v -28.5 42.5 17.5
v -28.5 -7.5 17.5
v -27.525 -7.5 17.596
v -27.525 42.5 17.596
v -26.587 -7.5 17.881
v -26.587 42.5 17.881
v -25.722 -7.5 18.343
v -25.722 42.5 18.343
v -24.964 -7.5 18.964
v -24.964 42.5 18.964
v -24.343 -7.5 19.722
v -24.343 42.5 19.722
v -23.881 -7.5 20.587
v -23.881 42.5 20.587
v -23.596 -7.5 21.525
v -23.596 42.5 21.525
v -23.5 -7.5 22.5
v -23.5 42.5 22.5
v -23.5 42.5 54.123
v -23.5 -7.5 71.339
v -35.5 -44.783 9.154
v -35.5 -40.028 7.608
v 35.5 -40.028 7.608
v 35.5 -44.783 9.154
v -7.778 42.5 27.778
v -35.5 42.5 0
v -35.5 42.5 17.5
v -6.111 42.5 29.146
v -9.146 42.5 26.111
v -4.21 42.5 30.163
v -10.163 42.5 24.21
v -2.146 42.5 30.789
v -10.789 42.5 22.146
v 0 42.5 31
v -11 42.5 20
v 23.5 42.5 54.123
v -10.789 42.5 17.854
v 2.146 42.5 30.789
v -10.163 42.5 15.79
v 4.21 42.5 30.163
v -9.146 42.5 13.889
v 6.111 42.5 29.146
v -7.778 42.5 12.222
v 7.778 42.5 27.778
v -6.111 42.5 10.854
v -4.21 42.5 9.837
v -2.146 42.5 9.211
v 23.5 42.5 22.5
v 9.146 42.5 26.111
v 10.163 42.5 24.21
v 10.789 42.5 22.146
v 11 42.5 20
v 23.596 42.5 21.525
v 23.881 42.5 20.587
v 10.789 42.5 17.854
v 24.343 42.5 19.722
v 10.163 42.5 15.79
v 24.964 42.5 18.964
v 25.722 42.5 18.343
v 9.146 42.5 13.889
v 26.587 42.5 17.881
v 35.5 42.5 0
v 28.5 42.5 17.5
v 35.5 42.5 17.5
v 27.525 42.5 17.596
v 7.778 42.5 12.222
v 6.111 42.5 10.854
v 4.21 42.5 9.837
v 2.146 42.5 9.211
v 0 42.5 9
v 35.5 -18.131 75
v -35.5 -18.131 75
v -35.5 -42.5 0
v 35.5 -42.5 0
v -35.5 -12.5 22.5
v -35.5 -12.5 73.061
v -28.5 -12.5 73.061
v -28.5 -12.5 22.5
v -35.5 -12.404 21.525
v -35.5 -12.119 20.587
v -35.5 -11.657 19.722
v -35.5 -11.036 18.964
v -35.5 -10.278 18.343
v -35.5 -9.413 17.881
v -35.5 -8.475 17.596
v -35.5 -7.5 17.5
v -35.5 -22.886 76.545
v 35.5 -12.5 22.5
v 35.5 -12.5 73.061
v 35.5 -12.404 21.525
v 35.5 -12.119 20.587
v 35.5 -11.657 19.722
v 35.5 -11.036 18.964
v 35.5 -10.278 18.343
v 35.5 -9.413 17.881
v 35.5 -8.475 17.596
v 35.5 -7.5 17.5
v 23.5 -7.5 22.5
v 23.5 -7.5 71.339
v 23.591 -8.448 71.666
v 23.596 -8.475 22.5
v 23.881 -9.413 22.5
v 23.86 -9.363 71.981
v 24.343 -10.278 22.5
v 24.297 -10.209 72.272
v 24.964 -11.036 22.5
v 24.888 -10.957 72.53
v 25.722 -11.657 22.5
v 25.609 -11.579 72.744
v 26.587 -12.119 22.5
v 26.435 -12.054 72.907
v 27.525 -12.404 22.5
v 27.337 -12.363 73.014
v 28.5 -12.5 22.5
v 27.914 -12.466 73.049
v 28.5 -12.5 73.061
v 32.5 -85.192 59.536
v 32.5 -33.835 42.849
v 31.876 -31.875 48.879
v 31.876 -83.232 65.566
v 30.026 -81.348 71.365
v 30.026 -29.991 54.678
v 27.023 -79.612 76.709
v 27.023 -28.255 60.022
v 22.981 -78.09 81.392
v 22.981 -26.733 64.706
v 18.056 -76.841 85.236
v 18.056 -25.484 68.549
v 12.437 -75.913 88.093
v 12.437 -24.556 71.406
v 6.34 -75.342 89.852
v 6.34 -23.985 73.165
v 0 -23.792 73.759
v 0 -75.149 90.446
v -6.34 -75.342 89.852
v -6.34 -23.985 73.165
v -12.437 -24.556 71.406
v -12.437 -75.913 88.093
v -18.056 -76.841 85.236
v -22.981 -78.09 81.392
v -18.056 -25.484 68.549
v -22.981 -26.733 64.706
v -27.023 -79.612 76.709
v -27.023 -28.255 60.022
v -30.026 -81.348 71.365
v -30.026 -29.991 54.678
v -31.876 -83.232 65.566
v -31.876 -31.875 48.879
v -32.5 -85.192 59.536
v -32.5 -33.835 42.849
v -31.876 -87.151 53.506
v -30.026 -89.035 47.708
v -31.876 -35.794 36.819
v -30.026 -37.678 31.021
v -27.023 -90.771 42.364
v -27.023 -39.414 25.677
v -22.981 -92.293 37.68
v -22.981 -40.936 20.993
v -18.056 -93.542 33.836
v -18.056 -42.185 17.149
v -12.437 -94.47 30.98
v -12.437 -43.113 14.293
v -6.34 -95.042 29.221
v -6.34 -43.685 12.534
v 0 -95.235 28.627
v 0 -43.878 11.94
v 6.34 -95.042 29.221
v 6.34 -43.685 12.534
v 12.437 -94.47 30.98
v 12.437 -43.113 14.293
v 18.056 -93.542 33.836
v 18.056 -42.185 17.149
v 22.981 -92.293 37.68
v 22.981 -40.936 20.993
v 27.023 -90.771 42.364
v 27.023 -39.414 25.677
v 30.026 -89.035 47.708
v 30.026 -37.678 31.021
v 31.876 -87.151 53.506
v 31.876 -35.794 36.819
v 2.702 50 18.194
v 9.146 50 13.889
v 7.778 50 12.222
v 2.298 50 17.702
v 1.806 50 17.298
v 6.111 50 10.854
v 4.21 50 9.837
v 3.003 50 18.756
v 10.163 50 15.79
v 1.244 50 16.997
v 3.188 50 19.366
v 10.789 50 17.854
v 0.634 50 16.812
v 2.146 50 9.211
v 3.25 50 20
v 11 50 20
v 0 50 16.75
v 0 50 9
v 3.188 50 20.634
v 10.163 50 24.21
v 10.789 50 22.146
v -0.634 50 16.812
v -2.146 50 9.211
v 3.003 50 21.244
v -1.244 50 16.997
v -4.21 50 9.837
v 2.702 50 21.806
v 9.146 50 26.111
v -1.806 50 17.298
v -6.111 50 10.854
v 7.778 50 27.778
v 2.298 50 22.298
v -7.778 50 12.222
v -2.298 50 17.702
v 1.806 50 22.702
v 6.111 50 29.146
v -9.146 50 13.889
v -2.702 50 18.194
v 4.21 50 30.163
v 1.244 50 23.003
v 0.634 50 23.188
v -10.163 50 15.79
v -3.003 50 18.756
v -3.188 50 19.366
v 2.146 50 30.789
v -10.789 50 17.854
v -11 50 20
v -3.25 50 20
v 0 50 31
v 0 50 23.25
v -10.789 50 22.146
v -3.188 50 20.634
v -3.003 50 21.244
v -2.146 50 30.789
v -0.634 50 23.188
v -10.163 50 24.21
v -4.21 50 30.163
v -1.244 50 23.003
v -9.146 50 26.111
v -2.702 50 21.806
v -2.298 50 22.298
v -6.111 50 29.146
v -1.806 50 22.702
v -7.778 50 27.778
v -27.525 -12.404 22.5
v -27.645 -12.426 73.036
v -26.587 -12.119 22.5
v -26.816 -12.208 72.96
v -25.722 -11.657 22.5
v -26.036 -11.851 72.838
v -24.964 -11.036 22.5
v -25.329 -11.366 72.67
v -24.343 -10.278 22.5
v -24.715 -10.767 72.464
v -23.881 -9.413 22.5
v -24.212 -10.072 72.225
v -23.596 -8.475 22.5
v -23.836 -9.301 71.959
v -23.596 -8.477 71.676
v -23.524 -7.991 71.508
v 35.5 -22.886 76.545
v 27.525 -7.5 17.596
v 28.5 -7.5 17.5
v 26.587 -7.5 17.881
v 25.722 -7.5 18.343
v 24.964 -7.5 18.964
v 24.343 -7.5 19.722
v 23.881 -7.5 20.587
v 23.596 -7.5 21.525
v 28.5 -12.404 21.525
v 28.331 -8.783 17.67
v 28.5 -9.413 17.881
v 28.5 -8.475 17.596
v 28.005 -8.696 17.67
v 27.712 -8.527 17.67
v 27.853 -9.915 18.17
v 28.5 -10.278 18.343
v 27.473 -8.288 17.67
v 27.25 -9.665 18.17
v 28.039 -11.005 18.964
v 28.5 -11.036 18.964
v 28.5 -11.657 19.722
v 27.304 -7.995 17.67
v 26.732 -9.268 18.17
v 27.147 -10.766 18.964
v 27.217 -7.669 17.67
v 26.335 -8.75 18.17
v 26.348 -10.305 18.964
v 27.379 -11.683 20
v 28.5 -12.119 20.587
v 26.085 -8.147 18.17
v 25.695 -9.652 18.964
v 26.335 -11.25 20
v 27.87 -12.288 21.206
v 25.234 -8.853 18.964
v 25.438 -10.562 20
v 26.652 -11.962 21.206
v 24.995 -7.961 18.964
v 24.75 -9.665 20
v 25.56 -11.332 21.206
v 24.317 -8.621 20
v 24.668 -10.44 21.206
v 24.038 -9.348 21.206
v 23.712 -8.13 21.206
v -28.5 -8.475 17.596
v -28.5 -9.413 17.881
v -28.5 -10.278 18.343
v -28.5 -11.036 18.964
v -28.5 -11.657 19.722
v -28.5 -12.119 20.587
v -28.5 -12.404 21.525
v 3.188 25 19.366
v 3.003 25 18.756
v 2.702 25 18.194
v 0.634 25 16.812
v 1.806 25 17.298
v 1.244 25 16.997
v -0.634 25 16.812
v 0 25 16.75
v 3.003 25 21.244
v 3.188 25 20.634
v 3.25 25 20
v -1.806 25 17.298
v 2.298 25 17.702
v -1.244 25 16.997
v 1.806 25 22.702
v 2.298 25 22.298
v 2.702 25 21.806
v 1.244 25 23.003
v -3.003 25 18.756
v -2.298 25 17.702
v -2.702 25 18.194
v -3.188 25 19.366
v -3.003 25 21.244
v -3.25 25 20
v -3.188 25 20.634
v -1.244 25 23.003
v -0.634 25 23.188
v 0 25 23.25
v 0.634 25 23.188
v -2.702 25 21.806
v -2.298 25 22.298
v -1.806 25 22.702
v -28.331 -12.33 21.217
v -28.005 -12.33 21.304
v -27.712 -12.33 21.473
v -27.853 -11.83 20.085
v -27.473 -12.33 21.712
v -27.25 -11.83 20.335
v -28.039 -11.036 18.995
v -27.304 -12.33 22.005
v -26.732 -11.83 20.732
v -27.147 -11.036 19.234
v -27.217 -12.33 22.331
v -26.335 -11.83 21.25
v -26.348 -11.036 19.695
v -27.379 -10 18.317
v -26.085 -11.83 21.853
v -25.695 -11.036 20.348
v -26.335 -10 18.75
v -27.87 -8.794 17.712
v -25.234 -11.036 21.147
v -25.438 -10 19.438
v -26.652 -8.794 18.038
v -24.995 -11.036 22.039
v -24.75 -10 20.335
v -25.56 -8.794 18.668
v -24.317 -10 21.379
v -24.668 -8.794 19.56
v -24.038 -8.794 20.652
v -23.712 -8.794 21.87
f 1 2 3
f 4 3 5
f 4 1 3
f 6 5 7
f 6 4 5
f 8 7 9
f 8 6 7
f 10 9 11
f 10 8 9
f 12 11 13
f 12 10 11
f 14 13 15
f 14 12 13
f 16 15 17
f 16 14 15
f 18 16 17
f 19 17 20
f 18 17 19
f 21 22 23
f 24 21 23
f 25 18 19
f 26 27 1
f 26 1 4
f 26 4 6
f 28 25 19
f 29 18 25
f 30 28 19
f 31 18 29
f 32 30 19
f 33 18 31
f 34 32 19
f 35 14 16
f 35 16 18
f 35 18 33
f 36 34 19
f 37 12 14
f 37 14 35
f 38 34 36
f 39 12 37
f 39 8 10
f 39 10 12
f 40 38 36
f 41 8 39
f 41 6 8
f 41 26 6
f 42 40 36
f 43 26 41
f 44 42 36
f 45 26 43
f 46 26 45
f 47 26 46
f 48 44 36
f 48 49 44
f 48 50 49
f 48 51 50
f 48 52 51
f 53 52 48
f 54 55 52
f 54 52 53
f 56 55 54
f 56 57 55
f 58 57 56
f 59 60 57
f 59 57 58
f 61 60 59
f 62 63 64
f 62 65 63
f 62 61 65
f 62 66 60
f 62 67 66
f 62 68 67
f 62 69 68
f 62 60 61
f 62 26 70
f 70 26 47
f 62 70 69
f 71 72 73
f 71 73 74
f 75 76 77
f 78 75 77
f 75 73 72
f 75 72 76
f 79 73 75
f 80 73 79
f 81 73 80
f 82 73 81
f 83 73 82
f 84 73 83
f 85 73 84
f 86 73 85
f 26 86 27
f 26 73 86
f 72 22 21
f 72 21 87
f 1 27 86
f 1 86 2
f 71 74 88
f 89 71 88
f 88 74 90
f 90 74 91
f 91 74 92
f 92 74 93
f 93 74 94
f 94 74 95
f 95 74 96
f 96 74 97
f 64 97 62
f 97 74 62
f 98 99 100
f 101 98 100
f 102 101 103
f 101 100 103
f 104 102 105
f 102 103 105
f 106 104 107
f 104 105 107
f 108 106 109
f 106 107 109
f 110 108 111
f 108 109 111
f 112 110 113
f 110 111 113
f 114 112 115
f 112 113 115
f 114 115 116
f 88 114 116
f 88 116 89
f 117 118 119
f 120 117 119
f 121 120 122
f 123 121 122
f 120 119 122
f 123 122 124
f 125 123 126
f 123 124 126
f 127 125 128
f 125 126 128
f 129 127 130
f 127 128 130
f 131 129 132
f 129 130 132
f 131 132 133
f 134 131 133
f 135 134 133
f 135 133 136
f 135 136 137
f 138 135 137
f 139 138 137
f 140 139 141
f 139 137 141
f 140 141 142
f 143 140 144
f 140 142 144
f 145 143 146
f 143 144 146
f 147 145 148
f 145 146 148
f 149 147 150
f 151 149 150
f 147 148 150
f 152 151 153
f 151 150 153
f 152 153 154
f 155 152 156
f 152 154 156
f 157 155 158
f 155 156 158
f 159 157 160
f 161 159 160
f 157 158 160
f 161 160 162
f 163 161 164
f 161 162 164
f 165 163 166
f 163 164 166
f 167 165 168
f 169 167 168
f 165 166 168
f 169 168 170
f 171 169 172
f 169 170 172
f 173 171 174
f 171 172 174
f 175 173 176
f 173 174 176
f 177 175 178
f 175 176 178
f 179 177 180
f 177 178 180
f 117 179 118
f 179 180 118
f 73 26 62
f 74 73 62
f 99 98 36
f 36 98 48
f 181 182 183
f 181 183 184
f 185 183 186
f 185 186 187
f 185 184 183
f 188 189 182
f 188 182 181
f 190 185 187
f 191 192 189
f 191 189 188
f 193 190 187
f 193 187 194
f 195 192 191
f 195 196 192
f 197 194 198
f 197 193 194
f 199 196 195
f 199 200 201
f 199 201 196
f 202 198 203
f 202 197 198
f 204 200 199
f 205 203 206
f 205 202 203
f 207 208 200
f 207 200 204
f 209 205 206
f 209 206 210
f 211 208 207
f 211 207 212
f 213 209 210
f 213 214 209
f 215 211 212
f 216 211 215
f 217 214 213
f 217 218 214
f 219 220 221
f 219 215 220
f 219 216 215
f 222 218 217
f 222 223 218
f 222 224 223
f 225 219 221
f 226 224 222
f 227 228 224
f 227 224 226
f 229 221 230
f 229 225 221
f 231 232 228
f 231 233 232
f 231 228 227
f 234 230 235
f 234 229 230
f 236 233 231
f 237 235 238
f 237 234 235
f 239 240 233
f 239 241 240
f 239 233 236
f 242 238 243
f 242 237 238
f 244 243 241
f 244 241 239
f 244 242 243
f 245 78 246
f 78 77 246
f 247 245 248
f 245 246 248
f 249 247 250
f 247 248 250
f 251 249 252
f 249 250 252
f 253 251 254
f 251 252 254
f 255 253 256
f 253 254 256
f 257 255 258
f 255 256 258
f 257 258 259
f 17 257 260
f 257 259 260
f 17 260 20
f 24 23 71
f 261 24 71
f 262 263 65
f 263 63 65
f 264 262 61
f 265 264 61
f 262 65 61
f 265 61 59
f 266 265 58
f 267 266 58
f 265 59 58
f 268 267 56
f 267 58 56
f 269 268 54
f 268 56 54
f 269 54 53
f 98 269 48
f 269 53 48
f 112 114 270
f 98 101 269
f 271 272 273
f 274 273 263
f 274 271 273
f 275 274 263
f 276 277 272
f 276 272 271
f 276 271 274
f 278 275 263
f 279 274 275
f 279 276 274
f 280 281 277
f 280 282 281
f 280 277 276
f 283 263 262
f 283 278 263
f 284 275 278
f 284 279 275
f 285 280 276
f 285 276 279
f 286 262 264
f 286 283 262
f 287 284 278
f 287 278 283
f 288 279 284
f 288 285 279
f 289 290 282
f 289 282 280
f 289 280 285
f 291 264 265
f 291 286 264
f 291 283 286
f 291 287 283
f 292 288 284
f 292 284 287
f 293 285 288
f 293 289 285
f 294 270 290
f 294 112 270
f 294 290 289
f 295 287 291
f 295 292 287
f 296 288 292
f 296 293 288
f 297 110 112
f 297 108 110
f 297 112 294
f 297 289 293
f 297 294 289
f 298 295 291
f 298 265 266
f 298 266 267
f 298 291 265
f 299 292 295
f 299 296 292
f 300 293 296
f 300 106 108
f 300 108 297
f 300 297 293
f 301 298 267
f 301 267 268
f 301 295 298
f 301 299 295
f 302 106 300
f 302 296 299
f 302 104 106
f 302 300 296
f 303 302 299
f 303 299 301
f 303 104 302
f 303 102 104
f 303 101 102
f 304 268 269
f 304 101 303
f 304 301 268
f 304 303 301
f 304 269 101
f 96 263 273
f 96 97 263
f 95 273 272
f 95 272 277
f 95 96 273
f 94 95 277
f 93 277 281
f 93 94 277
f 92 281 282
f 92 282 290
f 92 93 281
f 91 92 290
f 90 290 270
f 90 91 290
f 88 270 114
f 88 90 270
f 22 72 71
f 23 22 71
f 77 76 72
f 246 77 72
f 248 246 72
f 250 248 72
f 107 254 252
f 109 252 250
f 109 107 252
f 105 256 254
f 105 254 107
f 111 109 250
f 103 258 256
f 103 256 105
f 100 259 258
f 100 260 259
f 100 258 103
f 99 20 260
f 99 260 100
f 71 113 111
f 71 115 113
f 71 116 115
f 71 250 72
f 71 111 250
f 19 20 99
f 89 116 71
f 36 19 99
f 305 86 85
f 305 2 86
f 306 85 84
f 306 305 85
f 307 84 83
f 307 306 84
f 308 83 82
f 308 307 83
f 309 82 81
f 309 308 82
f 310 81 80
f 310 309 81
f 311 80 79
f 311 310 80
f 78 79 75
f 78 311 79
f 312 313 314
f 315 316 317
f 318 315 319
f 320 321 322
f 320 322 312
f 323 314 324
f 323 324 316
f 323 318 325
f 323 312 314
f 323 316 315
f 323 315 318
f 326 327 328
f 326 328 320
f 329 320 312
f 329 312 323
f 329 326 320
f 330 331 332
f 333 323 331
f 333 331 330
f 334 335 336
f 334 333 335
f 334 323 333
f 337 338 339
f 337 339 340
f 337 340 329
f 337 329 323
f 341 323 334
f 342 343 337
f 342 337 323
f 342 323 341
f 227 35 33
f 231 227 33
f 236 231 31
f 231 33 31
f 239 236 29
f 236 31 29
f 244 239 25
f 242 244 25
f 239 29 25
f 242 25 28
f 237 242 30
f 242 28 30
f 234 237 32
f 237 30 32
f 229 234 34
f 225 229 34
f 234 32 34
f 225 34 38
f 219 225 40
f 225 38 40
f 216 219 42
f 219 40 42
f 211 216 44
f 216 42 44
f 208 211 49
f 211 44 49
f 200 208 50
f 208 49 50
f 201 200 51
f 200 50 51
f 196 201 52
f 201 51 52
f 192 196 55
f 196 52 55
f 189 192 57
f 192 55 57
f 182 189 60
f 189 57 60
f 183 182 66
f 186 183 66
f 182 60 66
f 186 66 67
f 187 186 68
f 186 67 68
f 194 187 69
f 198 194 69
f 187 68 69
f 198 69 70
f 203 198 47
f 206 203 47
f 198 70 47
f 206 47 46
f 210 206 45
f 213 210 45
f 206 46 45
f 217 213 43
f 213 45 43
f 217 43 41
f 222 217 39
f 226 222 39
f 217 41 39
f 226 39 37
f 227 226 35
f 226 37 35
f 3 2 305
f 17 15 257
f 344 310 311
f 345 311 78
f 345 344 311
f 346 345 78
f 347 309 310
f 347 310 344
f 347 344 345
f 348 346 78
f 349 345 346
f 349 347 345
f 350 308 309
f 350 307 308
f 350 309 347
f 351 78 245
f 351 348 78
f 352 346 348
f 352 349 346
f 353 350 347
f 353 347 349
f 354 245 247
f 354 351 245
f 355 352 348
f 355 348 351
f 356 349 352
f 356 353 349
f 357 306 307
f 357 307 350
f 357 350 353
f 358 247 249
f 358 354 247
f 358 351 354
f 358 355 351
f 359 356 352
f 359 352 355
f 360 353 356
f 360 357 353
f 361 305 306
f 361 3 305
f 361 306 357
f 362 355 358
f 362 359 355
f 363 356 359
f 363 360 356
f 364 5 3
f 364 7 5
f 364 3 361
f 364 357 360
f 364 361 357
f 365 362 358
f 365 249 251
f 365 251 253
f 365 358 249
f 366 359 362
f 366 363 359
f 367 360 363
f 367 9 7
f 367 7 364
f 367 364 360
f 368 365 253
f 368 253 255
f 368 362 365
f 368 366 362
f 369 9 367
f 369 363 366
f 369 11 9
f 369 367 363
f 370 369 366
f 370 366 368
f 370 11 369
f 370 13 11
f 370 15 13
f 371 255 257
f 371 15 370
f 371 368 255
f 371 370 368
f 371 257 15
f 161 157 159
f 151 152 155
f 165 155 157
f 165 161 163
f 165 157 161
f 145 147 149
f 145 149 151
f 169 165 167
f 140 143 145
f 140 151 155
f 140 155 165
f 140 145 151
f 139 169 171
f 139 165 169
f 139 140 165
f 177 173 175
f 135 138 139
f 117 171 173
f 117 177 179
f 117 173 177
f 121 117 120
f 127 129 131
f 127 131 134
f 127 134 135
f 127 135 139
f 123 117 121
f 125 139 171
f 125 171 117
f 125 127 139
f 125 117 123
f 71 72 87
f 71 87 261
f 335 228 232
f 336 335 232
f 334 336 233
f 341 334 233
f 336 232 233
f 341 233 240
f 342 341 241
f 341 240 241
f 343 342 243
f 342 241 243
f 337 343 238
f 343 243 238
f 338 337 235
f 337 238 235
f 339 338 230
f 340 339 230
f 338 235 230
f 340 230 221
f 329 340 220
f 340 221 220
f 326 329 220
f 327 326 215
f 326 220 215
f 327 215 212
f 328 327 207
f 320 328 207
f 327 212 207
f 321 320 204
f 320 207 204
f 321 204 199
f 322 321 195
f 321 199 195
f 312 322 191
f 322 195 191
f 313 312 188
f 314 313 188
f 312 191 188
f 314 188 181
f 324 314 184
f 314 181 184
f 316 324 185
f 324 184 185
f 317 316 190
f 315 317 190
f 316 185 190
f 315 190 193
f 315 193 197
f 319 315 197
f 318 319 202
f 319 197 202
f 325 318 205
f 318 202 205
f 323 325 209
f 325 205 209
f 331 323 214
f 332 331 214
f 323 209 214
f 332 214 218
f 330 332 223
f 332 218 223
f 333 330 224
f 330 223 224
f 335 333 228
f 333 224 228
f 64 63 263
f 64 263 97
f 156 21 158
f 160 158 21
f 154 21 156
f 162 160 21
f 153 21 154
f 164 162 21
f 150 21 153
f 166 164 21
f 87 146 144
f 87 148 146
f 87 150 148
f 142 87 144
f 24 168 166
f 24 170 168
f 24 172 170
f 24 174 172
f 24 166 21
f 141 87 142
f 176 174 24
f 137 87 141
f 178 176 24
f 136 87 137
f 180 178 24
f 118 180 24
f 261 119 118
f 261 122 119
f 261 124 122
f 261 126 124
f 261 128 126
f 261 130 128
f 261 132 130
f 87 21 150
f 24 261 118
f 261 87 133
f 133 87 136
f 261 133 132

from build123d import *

# Parameters (mm, degrees)
F0_W      = 71
F0_H      = 85
F1_DEPTH  = 75
F3_W      = 71
F3_H      = 103.9073709636
F4_DEPTH  = 23.1772745781
F6_W      = 71
F6_H      = 81.7453698828
F7_DEPTH  = 19.7405301902
F9_W      = 12
F9_H      = 55
F10_DEPTH = 57.501
F11_R     = 5
F12_R     = 11
F13_DEPTH = 7.5
F14_R     = 3.25
F15_DEPTH = 25
F16_W     = 71
F16_H     = 70.8596668179
F17_DEPTH = 5
F18_R     = 32.5
F19_DEPTH = 54


with BuildPart() as f1:
    # F0 (on Top) → F1 (new body)
    with BuildSketch(Plane.XY):
        Rectangle(F0_W, F0_H)
    extrude(amount=F1_DEPTH)

    # F3 (on face) → F4 (cut, through all)
    with BuildSketch(Plane(origin=(0, -38.4416111305, 12.4904366112), x_dir=(1, 0, 0), z_dir=(0, -0.9510565163, 0.3090169944))):
        with Locations((0, 38.8204632208)):
            Rectangle(F3_W, F3_H)
    extrude(amount=F4_DEPTH, mode=Mode.SUBTRACT)

    # F6 (on face) → F7 (cut, through all)
    with BuildSketch(Plane(origin=(0, 21.1655143967, 61.4691171425), x_dir=(1, 0, 0), z_dir=(0, 0.3255681545, 0.9455185756))):
        with Locations((0, -0.6881454784)):
            Rectangle(F6_W, F6_H)
    extrude(amount=F7_DEPTH, mode=Mode.SUBTRACT)

    # F9 (on offset) → F10 (cut, through all)
    with BuildSketch(Plane.XY.offset(17.5)):
        with Locations((-29.5, 15)):
            Rectangle(F9_W, F9_H)
        with Locations((29.5, 15)):
            Rectangle(F9_W, F9_H)
    extrude(amount=F10_DEPTH, mode=Mode.SUBTRACT)

    # F11
    f11_edges = [f1.edges().sort_by_distance(p)[0] for p in [
        (-23.5, 15, 17.5),
        (-29.5, -12.5, 17.5),
        (-23.5, -12.5, 45.280542),
        (23.5, -12.5, 45.280542),
        (29.5, -12.5, 17.5),
        (23.5, 15, 17.5),
    ]]
    fillet(f11_edges, radius=F11_R)

    # F12 (on face) → F13 (join)
    with BuildSketch(Plane(origin=(0, 42.5, 0), x_dir=(-1, 0, 0), z_dir=(0, 1, 0))):
        with Locations((0, 20)):
            Circle(F12_R)
    extrude(amount=F13_DEPTH)

    # F14 (on face) → F15 (cut)
    with BuildSketch(Plane(origin=(0, 50, 0), x_dir=(-1, 0, 0), z_dir=(0, 1, 0))):
        with Locations((0, 20)):
            Circle(F14_R)
    extrude(amount=-F15_DEPTH, mode=Mode.SUBTRACT)


with BuildPart() as f17:
    # F16 (on face) → F17 (new body)
    with BuildSketch(Plane(origin=(0, -38.4416111305, 12.4904366112), x_dir=(1, 0, 0), z_dir=(0, -0.9510565163, 0.3090169944))):
        with Locations((0, 30.296611148)):
            Rectangle(F16_W, F16_H)
    extrude(amount=F17_DEPTH)

    # F18 (on face) → F19 (join)
    with BuildSketch(Plane(origin=(0, -43.1968937119, 14.0355215831), x_dir=(1, 0, 0), z_dir=(0, -0.9510565163, 0.3090169944))):
        with Locations((0, 30.296611148)):
            Circle(F18_R)
    extrude(amount=F19_DEPTH)


solid = Compound([f1.part, f17.part])
